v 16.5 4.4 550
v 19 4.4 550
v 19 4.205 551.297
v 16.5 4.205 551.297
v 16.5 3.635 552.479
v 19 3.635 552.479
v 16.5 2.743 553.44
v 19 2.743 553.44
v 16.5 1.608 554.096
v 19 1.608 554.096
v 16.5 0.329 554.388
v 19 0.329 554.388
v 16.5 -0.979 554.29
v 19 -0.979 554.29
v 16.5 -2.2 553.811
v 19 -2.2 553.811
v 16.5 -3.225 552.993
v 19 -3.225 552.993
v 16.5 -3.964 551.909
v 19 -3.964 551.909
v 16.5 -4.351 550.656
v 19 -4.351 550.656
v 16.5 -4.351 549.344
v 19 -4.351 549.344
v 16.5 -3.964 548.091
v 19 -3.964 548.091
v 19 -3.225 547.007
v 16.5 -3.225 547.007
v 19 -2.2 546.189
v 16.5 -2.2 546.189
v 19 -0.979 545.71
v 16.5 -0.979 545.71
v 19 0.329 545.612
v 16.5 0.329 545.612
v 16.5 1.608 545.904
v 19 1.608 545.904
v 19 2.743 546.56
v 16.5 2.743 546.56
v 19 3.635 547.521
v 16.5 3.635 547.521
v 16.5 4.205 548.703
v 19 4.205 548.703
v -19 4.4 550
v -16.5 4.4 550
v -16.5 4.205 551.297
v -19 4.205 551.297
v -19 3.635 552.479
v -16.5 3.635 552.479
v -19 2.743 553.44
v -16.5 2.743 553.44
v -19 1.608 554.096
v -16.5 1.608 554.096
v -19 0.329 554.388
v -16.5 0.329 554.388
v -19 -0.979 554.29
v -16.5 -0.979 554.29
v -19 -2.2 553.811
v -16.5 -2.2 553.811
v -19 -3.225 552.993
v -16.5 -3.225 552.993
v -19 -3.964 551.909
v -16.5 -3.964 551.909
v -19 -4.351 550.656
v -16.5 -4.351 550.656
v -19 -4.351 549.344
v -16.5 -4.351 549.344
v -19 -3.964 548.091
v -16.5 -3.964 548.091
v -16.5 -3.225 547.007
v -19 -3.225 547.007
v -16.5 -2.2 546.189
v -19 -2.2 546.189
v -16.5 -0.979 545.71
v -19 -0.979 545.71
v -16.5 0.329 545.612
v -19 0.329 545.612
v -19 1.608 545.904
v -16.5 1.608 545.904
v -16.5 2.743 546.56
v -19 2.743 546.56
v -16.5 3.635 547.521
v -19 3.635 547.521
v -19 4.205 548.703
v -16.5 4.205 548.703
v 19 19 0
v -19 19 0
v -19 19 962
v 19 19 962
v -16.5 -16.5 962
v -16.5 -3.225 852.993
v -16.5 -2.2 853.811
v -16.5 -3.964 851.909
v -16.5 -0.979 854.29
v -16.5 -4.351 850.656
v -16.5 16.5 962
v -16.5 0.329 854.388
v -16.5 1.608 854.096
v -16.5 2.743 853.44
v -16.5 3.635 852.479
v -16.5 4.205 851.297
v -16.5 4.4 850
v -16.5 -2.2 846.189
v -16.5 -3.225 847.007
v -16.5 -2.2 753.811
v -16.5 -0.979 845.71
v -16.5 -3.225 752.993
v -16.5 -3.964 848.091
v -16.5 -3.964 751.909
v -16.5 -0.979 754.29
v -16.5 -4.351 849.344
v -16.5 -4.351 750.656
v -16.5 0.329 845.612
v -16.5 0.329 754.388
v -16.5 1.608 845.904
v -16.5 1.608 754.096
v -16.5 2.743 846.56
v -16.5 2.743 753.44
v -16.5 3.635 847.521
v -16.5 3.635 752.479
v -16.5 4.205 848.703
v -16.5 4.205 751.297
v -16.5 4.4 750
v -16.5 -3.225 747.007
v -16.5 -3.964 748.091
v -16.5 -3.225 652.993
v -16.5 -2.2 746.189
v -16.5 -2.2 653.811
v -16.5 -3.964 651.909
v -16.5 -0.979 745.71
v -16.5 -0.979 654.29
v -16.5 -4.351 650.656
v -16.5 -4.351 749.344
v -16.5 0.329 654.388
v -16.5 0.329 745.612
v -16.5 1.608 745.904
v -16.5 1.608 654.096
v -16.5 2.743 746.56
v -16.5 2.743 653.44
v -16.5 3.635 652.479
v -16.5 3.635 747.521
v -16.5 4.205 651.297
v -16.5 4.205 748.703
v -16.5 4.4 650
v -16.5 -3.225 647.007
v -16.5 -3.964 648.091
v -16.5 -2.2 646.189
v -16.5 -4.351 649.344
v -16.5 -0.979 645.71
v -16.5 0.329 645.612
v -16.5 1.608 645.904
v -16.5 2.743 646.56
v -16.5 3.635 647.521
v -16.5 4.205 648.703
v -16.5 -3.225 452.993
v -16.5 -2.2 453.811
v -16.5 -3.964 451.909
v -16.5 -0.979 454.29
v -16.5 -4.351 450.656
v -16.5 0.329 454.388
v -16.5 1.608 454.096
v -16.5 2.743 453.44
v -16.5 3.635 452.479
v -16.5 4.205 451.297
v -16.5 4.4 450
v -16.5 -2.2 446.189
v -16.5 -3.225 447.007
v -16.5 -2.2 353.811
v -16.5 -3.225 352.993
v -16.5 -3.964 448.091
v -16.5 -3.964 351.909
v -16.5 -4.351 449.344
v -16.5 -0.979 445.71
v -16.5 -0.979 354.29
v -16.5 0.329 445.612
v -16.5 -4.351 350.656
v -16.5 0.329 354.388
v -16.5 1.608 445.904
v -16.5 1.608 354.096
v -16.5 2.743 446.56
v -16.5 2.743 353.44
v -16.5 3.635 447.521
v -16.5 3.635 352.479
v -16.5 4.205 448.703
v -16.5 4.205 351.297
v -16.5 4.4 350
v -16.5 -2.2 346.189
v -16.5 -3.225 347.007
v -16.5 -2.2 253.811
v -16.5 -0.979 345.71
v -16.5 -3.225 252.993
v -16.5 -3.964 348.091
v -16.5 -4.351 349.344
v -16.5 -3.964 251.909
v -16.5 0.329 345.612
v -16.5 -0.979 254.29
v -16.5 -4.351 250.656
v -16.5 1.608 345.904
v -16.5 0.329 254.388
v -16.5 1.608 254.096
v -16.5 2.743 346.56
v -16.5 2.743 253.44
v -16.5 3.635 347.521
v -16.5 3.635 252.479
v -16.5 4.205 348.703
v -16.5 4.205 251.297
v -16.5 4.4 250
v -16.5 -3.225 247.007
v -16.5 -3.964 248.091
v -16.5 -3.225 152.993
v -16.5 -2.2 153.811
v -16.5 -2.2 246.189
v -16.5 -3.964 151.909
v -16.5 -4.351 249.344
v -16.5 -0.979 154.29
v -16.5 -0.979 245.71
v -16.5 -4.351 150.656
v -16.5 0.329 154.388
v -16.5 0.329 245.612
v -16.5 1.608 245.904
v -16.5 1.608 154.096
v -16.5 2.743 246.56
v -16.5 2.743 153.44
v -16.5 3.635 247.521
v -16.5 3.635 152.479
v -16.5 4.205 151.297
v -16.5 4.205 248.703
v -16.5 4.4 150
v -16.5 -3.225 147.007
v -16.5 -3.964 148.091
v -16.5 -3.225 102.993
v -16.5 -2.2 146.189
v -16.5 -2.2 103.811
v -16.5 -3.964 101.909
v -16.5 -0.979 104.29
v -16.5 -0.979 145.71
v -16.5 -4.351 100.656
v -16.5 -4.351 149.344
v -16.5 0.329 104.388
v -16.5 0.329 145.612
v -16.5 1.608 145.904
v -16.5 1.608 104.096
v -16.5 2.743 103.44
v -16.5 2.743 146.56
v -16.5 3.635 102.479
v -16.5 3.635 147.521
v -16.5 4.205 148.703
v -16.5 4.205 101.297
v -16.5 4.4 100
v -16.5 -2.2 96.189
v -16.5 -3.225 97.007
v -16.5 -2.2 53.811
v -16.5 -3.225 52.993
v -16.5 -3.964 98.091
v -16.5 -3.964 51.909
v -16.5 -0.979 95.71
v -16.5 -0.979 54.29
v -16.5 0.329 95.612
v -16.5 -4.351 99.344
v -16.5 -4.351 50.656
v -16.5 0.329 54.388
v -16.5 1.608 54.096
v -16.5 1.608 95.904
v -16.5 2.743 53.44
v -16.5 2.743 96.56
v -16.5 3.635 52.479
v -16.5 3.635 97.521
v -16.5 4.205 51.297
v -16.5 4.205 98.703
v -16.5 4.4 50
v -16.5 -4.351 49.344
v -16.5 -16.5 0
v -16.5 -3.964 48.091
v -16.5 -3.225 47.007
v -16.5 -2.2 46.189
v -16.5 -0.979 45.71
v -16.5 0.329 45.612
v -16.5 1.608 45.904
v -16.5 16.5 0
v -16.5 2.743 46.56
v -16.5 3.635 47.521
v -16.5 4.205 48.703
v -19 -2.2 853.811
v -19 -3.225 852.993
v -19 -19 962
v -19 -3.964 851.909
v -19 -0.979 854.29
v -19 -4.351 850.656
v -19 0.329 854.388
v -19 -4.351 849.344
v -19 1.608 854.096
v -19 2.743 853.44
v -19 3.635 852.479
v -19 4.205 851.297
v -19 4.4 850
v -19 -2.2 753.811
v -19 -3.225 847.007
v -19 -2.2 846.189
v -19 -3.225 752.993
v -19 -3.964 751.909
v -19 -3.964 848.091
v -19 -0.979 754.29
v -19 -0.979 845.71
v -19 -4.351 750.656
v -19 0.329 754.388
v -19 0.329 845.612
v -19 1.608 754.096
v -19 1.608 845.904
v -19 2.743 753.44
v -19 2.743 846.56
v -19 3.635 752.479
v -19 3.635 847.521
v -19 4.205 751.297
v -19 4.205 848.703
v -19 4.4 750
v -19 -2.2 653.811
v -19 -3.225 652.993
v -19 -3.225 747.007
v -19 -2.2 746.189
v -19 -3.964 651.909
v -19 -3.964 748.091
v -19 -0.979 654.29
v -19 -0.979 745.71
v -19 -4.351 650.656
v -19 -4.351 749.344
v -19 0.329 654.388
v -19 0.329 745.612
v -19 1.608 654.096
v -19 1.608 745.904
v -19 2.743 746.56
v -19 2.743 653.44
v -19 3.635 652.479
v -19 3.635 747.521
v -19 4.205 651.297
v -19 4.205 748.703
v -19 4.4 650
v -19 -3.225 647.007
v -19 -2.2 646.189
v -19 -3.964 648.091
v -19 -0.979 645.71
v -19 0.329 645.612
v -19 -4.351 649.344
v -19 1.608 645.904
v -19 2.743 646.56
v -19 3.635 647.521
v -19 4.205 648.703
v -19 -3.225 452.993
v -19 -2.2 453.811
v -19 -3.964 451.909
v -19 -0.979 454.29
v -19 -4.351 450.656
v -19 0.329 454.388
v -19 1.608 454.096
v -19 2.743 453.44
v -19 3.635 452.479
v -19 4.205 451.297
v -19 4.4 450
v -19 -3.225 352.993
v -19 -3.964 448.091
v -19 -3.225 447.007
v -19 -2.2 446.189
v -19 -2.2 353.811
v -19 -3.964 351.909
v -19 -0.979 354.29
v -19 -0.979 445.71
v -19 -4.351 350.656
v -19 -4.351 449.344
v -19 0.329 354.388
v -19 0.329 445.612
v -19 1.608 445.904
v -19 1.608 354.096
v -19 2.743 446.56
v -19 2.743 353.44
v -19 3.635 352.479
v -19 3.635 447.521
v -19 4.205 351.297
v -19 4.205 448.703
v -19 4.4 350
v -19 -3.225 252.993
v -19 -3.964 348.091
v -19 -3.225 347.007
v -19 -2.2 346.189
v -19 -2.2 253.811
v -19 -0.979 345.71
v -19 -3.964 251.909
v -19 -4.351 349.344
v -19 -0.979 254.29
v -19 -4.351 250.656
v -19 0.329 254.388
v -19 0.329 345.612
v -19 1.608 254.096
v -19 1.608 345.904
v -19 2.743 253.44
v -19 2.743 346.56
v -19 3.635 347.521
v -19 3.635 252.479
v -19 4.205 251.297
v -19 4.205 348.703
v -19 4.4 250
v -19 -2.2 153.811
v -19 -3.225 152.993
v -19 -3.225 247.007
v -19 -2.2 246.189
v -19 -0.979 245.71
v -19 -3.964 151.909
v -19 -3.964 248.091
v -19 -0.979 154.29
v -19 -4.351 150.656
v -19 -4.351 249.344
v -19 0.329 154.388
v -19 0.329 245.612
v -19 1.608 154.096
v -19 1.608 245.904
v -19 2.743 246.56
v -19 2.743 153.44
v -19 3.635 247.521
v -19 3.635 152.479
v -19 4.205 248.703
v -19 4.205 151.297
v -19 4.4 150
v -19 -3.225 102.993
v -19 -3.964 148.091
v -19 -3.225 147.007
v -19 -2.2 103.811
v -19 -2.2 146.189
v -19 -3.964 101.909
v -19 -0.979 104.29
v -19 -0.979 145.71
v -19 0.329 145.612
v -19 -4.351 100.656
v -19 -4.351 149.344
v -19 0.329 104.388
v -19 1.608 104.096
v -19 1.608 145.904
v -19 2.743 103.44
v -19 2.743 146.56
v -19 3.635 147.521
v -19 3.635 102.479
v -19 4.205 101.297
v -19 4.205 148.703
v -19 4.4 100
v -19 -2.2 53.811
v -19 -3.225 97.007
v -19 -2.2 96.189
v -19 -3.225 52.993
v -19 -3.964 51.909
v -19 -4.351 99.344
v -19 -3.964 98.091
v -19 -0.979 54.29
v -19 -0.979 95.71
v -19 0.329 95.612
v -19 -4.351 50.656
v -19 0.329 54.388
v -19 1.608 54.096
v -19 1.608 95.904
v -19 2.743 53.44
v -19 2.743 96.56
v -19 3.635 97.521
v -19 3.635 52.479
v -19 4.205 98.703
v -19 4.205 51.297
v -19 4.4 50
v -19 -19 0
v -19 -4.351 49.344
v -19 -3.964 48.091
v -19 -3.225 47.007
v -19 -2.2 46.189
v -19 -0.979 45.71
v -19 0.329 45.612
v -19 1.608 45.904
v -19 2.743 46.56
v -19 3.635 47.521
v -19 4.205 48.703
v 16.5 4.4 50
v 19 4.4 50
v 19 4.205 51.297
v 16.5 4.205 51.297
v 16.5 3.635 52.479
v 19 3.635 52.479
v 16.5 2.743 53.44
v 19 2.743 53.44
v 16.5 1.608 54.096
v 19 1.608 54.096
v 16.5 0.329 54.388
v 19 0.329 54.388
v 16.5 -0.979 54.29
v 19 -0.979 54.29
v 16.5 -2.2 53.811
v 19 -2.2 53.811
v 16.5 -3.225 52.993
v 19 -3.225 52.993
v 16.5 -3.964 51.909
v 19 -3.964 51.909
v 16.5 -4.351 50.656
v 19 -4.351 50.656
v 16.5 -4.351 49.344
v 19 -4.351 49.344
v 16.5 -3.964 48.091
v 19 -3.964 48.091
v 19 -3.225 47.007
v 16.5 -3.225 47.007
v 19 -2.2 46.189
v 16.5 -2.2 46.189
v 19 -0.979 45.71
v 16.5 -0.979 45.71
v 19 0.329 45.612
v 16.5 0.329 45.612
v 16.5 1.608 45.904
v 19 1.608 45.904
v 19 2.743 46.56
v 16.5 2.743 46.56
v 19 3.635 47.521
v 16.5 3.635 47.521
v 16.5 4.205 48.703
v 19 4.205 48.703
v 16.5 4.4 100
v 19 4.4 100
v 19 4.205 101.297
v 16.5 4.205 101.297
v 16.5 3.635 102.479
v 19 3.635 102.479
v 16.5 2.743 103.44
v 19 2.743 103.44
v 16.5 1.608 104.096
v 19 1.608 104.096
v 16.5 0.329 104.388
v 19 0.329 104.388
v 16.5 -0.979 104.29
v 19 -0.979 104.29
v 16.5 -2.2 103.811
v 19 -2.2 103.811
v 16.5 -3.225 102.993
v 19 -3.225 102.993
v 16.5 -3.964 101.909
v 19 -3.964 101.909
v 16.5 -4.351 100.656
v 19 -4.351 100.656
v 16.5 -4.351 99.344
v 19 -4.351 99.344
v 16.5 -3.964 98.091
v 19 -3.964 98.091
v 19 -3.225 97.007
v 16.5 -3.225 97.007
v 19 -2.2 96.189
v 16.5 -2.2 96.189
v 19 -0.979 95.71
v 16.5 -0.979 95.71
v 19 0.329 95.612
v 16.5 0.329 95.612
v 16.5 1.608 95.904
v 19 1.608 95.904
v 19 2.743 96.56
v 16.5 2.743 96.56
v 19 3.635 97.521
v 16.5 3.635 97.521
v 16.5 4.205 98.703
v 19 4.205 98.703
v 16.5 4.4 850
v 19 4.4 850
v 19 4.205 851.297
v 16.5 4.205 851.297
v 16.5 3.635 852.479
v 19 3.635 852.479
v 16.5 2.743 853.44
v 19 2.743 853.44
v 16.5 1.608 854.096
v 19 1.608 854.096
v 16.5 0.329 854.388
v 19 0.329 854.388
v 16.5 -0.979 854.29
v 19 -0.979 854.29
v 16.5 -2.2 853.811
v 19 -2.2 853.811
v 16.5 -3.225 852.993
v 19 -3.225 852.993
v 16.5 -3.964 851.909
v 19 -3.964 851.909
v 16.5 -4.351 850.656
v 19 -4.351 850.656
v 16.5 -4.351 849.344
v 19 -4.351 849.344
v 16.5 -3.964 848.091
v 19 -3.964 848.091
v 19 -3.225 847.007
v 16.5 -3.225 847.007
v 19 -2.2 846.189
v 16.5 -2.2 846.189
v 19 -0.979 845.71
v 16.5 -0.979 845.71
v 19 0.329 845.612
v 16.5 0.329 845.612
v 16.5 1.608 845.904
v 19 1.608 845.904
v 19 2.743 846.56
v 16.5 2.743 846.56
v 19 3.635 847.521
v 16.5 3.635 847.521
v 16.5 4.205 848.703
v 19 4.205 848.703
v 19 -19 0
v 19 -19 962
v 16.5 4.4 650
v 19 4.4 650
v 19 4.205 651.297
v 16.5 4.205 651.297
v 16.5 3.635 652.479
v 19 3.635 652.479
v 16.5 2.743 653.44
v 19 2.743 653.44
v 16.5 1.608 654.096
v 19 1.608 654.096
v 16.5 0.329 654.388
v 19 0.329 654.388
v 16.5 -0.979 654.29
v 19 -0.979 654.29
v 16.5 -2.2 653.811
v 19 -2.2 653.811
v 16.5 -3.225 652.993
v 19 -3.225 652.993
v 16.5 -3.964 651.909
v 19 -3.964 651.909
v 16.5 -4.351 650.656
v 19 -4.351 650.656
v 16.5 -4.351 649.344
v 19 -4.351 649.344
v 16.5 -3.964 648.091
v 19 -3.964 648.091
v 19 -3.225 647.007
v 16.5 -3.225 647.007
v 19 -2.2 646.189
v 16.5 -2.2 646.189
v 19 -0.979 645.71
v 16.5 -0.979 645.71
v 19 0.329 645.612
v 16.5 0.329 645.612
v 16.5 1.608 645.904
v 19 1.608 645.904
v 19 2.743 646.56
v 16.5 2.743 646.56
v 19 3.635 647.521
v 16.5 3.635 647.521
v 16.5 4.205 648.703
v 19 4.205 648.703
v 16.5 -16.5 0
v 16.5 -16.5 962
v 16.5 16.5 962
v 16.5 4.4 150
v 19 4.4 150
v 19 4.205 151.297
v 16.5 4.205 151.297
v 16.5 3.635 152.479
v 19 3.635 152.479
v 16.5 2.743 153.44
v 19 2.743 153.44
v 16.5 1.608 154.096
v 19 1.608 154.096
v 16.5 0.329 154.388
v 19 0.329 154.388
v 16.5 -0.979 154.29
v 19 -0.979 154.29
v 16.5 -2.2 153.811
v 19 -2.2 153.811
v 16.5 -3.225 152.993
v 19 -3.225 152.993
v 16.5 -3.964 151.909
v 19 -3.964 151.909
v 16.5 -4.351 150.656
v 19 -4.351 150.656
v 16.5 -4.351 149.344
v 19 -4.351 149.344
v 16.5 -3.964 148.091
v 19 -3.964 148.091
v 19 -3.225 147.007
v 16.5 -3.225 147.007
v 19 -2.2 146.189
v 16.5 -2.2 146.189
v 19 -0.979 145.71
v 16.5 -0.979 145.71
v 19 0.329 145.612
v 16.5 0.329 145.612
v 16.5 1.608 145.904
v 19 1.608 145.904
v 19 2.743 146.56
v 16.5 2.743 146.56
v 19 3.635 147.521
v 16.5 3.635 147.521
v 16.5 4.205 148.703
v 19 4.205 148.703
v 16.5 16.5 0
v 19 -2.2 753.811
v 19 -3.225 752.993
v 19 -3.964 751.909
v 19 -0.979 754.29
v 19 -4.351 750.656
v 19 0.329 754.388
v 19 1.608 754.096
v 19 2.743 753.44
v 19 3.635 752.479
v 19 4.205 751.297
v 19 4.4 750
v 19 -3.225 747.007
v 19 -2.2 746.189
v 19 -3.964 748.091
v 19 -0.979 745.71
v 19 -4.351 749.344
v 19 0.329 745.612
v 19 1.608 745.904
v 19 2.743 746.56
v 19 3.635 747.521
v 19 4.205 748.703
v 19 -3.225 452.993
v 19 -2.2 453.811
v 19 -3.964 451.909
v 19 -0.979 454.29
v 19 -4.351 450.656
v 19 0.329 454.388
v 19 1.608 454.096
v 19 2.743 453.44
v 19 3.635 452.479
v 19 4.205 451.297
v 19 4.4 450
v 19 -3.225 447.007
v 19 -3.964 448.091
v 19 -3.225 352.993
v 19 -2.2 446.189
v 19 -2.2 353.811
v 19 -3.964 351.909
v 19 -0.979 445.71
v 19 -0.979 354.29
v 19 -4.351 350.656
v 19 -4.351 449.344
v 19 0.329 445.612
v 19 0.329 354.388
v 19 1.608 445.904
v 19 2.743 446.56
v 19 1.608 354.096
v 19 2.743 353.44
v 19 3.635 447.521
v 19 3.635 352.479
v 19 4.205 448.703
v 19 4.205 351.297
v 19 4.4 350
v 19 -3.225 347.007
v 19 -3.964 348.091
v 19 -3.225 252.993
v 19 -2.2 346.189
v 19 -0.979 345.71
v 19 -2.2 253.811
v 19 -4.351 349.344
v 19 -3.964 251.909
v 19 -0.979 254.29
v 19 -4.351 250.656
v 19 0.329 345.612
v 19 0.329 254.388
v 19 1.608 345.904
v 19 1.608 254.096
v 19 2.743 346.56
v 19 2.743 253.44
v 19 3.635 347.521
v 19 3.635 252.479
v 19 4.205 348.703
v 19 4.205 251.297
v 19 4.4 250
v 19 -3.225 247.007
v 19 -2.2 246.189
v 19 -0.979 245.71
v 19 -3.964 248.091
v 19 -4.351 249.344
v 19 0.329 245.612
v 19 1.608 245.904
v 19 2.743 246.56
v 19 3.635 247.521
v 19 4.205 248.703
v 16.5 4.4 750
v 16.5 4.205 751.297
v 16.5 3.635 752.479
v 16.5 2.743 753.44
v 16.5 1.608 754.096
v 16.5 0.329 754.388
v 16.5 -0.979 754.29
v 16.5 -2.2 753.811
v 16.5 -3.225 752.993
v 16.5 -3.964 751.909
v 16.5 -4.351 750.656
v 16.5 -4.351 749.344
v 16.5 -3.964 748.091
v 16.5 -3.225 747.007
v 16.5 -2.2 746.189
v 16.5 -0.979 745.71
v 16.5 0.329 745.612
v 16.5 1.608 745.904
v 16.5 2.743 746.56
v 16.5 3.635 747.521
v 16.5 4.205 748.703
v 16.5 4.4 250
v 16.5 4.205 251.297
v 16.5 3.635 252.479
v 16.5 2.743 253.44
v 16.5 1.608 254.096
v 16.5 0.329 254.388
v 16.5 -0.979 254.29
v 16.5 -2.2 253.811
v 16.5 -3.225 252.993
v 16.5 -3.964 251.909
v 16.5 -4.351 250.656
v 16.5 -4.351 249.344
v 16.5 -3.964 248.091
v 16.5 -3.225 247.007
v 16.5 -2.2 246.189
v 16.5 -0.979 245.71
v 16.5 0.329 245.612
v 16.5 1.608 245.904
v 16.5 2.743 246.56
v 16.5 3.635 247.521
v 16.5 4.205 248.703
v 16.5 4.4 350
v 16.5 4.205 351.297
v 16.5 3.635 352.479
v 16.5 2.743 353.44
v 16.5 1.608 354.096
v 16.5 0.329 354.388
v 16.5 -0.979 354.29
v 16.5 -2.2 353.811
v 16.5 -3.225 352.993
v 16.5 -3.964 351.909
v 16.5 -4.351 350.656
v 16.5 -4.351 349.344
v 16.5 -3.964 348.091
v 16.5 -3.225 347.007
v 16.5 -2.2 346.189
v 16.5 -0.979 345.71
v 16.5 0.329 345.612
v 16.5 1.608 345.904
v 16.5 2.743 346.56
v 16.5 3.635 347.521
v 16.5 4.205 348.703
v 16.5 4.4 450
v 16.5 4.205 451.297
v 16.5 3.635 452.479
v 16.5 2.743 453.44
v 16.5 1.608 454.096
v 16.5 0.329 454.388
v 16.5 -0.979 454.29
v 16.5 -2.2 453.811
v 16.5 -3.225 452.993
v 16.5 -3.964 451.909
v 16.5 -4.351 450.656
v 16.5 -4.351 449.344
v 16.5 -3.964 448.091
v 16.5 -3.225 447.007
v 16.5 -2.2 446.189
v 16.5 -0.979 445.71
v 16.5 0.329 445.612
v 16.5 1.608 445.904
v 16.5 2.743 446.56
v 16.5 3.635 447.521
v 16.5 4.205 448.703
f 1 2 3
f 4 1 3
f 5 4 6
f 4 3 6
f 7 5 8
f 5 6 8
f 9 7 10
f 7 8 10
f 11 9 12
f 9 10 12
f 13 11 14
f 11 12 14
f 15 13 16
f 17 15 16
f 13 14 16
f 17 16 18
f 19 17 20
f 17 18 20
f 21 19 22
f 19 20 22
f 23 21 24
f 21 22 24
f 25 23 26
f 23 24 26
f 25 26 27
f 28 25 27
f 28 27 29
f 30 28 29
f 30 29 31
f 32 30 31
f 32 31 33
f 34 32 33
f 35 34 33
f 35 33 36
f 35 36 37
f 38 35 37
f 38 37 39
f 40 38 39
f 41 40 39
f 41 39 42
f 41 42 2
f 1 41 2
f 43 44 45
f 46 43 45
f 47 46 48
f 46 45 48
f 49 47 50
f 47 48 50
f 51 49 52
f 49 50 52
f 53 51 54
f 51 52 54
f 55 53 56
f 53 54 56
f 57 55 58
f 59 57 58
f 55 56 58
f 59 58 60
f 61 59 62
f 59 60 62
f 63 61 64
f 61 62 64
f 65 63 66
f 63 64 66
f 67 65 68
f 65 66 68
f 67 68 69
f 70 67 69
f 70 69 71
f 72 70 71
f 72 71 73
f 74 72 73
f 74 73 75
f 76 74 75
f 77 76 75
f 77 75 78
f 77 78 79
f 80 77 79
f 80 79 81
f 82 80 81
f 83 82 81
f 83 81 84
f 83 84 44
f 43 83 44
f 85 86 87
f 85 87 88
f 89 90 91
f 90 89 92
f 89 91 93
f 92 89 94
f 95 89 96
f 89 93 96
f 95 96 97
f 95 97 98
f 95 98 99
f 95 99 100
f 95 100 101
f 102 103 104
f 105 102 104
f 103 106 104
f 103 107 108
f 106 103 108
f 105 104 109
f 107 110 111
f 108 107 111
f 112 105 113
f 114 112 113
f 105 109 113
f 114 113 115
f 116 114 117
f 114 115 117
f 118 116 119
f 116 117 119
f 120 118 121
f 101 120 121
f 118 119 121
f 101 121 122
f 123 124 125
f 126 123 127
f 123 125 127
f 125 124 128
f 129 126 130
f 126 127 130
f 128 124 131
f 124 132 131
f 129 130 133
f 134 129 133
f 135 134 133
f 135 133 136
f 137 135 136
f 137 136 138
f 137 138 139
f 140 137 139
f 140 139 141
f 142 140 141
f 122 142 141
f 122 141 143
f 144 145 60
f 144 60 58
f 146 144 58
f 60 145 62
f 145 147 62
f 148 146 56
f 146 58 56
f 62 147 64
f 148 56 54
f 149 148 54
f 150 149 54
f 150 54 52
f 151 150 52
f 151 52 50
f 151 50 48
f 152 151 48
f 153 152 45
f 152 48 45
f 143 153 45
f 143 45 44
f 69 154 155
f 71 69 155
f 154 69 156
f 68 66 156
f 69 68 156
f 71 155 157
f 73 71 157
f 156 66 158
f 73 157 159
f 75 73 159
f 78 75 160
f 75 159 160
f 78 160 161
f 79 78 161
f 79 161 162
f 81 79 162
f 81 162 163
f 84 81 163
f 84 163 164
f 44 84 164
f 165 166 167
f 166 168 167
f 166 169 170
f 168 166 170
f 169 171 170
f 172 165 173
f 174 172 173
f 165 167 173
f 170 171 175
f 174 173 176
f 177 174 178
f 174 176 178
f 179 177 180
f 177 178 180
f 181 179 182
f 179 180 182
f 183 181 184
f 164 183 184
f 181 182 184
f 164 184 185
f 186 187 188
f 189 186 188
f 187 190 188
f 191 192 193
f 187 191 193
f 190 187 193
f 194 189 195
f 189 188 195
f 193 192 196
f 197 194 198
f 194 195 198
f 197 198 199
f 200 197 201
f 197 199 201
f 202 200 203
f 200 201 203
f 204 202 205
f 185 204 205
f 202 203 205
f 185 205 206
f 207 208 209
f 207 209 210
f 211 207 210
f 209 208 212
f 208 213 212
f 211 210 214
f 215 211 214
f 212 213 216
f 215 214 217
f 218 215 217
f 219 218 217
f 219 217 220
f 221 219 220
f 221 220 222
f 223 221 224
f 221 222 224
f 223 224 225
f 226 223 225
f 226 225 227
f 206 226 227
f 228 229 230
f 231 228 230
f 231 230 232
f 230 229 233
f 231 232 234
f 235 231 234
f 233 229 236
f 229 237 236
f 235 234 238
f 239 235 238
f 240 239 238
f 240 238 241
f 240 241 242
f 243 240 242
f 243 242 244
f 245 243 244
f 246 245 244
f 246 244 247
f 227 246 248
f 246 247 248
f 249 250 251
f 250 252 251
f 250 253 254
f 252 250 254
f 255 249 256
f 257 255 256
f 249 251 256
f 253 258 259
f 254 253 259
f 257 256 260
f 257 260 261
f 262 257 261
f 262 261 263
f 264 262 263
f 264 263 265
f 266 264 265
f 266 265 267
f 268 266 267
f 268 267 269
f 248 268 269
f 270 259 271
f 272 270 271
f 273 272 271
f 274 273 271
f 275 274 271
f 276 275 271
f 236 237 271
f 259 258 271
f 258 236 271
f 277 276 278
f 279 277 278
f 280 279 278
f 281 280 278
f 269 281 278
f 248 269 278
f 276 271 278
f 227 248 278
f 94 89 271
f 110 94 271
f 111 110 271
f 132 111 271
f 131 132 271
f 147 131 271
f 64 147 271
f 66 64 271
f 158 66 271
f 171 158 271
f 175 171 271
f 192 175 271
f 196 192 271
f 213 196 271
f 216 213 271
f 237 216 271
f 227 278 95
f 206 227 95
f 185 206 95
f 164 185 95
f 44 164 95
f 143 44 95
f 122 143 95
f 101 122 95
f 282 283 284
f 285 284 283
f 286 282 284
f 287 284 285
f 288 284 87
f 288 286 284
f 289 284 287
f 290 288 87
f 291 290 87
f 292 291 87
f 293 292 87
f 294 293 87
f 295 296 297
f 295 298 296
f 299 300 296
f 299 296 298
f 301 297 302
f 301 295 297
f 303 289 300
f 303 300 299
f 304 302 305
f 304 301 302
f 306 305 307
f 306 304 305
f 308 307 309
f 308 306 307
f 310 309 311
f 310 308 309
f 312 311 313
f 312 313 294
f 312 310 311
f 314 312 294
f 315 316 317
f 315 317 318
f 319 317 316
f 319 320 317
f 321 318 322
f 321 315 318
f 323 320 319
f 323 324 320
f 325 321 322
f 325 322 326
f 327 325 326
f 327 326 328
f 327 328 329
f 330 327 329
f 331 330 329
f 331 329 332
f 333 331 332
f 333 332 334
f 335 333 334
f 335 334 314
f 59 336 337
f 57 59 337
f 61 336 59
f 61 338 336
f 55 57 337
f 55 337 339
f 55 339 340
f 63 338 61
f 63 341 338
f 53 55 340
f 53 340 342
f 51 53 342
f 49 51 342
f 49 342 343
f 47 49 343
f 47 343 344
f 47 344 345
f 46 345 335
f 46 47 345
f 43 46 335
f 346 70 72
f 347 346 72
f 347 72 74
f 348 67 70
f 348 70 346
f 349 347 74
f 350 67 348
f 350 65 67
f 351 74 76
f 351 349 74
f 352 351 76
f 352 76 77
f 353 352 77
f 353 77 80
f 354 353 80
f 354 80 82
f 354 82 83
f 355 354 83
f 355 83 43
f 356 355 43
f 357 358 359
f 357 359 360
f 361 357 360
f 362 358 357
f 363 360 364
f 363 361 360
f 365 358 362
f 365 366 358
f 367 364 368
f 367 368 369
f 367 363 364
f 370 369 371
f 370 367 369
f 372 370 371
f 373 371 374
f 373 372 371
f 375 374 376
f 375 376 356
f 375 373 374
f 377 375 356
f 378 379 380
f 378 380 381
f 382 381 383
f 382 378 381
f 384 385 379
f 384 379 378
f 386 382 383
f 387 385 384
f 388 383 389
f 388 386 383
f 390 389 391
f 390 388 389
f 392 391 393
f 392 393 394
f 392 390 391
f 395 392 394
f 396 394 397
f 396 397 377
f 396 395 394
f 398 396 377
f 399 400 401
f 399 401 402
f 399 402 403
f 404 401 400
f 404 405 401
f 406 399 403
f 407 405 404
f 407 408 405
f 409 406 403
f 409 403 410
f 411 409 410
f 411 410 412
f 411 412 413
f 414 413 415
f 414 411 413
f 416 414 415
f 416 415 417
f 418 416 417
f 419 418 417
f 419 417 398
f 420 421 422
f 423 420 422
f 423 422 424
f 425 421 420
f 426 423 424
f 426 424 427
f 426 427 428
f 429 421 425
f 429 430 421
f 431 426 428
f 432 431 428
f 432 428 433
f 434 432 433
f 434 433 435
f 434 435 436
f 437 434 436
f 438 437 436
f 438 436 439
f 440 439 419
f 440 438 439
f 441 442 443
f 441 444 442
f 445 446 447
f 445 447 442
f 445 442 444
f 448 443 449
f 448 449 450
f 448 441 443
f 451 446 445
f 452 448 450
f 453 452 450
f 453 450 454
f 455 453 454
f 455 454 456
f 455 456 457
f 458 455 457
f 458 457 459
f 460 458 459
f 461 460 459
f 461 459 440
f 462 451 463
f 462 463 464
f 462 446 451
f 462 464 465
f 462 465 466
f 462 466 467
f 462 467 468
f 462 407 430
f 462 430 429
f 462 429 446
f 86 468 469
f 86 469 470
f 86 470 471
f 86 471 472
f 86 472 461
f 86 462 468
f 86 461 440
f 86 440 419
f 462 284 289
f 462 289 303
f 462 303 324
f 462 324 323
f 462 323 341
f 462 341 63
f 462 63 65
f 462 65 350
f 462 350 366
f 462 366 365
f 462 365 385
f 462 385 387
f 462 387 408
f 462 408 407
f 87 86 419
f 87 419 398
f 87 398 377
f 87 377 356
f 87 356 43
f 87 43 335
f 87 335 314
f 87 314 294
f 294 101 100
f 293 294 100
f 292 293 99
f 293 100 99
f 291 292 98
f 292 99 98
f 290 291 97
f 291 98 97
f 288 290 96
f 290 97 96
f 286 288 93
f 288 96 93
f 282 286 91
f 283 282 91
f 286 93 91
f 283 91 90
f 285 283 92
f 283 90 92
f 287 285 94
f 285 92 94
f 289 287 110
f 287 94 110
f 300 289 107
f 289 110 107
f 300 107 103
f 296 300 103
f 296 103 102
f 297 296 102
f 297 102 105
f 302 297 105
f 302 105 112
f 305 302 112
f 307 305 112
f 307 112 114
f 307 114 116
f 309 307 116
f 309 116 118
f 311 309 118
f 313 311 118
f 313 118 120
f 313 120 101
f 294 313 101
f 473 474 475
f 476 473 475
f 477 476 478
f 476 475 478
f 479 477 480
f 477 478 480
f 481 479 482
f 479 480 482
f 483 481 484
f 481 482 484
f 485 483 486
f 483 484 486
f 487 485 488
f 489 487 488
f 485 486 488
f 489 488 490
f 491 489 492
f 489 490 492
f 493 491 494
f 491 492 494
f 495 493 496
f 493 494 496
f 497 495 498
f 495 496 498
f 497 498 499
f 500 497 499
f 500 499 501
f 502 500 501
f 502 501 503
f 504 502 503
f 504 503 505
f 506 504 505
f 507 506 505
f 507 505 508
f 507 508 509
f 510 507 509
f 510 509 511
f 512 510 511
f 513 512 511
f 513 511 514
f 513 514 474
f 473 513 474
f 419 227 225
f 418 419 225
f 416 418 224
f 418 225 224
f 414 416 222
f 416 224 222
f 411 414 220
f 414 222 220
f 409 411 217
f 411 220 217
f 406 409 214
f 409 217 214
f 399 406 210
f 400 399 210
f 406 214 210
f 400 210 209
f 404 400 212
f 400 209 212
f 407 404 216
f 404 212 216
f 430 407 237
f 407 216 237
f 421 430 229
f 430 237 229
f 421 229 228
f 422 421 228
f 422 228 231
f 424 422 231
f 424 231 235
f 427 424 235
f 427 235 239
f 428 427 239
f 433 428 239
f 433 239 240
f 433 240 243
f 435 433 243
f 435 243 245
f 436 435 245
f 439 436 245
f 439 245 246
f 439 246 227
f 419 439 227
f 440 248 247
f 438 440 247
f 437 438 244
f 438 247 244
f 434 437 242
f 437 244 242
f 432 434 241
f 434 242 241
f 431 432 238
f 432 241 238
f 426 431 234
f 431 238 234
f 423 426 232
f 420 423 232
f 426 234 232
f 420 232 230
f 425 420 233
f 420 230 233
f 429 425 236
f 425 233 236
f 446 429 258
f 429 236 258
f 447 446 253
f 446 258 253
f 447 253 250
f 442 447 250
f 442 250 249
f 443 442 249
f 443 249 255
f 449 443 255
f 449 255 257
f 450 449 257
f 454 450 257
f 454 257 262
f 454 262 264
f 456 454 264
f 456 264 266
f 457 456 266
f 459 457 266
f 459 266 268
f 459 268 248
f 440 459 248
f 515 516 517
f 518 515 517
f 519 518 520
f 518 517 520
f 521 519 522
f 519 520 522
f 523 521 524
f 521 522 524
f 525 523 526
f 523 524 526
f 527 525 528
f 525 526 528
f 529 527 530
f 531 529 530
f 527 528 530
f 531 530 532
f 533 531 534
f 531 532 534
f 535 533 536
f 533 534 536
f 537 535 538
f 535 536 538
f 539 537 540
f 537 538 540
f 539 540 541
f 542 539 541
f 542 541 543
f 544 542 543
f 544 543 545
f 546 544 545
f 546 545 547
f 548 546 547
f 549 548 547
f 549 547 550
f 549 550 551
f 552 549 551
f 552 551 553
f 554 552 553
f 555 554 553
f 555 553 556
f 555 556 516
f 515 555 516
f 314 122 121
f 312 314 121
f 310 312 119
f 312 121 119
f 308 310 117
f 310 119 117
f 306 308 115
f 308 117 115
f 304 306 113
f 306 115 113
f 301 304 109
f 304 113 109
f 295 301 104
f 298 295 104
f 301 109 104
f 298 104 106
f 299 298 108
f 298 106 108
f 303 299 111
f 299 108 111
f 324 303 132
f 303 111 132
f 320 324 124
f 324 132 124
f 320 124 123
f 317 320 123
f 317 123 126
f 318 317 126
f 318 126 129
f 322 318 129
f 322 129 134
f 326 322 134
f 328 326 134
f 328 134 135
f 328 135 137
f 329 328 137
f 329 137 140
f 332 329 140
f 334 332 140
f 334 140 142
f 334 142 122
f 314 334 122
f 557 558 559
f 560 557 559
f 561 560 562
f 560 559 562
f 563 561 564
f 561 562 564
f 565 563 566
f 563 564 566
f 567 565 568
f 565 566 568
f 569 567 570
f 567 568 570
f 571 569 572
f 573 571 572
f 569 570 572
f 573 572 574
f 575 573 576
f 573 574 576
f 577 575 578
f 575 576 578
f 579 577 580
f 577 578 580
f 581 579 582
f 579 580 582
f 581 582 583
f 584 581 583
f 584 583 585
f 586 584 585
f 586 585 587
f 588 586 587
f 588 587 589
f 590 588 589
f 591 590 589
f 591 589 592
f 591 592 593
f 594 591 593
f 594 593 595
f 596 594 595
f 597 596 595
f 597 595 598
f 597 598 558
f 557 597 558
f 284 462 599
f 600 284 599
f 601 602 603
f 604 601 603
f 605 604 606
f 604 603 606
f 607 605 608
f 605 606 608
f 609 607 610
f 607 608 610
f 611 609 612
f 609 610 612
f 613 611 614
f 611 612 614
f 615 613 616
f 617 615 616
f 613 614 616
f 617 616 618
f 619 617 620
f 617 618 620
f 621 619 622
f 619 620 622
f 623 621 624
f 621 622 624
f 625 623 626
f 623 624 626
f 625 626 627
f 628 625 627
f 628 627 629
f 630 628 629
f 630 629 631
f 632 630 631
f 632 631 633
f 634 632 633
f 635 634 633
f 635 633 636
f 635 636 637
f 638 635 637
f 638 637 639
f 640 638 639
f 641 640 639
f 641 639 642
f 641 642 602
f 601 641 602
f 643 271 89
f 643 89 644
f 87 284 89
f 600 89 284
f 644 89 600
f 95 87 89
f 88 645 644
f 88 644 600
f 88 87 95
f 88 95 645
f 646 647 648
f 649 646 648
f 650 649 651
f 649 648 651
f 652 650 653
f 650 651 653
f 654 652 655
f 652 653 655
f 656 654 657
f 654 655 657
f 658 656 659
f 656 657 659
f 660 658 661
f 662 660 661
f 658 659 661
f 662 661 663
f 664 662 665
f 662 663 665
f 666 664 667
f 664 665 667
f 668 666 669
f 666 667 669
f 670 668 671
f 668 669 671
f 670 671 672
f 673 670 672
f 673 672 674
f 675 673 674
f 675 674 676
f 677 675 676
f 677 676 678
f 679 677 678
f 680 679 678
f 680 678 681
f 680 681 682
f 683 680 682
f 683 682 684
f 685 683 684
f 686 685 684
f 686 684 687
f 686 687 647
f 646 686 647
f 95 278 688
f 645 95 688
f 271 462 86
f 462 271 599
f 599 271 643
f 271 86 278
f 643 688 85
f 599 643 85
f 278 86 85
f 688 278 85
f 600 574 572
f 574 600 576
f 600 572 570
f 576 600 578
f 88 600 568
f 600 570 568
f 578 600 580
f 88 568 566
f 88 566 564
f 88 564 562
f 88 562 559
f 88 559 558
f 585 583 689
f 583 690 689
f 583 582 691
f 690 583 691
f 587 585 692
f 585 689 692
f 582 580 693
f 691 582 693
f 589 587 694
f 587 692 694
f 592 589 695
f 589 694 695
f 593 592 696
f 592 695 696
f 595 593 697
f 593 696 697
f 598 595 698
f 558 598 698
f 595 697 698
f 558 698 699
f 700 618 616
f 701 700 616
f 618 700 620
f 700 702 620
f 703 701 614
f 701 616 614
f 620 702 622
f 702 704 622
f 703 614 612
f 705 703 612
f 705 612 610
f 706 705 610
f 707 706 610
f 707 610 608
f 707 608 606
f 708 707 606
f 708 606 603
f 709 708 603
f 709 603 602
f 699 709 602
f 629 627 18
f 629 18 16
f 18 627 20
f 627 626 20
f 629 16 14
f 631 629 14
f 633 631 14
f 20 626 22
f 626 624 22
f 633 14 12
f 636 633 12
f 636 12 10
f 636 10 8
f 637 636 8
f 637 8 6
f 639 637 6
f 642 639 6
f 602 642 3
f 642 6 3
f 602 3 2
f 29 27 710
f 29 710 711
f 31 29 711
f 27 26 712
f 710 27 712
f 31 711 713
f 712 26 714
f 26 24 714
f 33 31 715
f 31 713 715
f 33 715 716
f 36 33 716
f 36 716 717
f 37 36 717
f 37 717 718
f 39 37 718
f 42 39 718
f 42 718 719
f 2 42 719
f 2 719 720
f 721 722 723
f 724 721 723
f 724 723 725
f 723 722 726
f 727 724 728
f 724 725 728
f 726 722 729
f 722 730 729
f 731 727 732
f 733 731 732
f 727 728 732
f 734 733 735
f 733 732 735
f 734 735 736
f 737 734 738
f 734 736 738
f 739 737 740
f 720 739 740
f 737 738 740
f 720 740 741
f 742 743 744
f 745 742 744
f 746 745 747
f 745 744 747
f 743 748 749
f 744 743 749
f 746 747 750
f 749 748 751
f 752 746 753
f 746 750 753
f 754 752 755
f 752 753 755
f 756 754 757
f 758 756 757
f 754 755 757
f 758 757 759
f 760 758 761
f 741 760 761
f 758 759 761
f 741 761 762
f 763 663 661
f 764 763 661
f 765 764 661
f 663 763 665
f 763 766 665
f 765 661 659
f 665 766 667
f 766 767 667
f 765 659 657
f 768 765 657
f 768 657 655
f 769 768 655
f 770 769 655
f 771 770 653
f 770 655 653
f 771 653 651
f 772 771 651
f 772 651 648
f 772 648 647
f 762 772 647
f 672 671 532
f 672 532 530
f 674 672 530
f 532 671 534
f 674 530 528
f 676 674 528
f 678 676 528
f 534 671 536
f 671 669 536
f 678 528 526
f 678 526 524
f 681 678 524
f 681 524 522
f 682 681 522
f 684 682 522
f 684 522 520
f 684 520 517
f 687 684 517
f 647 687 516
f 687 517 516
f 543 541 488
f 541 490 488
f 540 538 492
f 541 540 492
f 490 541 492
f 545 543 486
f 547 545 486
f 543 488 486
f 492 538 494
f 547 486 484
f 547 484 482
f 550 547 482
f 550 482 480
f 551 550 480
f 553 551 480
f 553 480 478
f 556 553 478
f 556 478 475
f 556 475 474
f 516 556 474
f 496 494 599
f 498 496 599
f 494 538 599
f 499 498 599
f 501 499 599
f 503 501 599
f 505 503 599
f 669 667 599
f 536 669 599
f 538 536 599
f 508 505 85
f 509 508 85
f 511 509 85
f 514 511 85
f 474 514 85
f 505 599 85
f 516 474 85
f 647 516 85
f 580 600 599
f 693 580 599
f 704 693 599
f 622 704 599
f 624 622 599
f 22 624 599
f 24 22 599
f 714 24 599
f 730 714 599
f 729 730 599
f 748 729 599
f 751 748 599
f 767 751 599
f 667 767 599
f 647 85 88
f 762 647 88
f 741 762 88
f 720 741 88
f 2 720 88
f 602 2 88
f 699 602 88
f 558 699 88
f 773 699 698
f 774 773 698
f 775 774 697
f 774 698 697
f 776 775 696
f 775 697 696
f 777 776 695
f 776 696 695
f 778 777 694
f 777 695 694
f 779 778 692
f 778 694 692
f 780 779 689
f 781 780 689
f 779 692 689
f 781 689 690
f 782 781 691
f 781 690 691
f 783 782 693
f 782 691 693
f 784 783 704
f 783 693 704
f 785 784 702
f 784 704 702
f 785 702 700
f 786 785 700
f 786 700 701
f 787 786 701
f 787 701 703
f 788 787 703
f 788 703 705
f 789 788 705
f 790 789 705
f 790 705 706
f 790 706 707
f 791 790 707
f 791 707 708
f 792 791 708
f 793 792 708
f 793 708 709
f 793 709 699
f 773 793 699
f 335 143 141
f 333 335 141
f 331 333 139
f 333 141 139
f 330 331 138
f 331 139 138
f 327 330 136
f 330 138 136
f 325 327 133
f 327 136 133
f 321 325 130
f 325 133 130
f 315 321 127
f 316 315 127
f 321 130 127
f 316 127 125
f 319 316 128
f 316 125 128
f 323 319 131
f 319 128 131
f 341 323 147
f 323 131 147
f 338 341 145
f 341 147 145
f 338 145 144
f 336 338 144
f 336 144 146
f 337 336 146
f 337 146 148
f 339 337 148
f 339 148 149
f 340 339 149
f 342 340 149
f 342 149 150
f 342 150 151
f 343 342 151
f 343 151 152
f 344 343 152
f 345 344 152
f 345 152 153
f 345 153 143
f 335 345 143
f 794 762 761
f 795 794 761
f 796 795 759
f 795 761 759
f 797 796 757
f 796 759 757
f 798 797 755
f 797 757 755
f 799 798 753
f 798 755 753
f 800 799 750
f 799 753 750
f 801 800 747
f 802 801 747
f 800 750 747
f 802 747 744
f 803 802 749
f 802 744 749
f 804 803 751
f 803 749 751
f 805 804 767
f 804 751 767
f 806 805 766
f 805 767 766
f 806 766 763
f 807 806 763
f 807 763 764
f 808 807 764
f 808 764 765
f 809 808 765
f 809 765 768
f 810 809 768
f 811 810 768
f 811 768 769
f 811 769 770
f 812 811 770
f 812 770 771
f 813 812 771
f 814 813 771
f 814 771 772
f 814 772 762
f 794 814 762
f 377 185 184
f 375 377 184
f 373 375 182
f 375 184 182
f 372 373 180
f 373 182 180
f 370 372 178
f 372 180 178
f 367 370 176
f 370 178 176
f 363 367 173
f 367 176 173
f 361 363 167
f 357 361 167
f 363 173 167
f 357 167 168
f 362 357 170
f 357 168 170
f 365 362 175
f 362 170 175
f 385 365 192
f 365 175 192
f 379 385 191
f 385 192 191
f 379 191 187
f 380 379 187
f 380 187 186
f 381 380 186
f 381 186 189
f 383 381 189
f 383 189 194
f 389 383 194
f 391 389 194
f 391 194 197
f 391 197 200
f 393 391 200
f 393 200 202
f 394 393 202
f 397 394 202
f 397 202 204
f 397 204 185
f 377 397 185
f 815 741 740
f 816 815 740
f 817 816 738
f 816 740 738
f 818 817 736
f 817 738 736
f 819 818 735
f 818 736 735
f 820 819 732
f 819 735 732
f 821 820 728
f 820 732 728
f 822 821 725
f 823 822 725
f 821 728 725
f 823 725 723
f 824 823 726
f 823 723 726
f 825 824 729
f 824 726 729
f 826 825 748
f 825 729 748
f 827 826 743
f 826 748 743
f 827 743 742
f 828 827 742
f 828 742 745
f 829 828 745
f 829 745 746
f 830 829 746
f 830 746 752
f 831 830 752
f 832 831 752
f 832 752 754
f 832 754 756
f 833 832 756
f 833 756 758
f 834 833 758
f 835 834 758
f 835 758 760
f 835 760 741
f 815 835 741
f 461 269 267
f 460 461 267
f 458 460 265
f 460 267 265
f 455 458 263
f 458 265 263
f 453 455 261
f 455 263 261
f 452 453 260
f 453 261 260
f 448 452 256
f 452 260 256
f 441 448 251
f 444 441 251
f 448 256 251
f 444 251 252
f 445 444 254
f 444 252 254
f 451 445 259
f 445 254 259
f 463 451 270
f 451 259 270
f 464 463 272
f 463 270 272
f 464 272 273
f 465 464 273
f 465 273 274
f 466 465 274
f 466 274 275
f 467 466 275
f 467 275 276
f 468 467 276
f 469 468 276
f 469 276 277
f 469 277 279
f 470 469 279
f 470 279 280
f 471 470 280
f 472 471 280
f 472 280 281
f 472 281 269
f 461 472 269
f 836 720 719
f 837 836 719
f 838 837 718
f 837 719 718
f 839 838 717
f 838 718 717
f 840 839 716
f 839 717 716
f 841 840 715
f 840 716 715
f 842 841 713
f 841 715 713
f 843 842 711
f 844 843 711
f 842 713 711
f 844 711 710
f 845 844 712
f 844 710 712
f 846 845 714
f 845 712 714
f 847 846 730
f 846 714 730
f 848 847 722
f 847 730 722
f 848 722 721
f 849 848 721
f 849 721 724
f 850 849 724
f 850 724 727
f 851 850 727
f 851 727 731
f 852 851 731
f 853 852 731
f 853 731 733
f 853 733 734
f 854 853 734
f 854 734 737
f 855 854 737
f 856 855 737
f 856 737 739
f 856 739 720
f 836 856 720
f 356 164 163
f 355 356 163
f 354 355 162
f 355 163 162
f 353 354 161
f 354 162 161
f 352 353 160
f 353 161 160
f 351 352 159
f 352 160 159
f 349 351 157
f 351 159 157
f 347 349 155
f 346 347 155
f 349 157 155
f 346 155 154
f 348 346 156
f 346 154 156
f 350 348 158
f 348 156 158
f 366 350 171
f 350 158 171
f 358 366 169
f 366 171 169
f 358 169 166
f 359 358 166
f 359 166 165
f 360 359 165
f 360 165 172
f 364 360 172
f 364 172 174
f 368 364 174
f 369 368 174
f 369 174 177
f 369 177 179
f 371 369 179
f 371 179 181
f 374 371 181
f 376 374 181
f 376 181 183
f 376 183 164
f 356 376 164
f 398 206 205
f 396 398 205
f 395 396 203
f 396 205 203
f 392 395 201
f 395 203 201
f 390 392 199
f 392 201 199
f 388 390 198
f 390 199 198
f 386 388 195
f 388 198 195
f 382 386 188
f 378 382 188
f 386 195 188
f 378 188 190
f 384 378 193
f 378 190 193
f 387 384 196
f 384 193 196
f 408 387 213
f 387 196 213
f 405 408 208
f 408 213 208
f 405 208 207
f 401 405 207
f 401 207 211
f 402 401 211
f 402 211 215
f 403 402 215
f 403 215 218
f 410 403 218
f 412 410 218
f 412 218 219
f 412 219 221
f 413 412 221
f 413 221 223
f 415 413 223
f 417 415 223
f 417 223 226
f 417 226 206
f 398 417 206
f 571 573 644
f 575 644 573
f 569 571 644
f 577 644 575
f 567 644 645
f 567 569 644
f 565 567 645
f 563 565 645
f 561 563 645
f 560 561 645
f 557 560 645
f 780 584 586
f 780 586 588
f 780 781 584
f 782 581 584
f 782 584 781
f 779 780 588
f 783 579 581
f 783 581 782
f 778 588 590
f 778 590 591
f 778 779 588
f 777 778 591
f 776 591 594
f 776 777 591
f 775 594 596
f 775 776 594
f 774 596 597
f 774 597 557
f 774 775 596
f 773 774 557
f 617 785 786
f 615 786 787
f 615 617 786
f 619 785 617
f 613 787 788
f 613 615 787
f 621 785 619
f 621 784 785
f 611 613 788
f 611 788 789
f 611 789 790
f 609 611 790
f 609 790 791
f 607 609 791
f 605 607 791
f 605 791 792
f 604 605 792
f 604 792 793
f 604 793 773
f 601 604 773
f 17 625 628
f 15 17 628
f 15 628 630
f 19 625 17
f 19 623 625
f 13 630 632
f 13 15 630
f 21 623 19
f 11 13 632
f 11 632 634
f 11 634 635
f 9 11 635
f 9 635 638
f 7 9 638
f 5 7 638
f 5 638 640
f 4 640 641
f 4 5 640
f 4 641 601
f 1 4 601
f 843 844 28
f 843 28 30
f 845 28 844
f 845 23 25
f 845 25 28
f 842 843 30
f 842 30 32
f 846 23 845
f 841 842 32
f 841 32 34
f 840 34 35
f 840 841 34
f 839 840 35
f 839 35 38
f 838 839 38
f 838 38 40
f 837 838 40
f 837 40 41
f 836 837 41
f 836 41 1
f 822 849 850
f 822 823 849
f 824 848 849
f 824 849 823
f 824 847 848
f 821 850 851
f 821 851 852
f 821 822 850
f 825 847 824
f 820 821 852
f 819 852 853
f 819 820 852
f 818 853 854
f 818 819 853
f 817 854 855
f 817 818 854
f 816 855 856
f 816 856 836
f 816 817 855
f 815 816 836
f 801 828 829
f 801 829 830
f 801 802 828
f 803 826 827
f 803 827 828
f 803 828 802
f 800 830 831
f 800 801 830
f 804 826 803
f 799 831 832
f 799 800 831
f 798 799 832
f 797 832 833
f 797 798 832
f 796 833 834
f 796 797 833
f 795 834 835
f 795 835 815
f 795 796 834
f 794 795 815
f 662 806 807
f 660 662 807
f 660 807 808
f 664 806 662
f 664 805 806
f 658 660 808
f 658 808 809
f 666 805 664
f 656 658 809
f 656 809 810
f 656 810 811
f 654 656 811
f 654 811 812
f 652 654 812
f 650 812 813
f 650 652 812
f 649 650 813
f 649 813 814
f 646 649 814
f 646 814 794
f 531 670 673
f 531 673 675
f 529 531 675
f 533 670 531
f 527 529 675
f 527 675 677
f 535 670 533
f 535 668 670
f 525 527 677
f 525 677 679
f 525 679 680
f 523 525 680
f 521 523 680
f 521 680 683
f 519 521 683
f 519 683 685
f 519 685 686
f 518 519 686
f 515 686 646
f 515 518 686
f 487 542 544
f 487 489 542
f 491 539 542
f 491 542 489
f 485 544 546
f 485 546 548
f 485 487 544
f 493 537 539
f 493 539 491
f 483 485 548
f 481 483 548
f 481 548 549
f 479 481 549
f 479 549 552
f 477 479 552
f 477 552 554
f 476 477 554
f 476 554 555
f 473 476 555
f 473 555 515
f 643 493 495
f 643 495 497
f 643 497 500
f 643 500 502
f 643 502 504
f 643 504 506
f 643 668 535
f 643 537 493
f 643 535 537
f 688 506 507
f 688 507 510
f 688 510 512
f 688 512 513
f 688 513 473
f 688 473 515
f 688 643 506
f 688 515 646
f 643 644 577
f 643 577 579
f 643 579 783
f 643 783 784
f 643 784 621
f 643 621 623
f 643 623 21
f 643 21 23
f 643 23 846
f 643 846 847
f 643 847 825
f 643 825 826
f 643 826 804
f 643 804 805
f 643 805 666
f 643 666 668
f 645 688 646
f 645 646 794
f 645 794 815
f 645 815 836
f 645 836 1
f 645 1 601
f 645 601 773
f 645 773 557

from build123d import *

# Parameters (mm, degrees)
F0_W     = 38
F0_H     = 38
F0_W_2   = 33
F0_H_2   = 33
F1_DEPTH = 962
F3_D     = 8.8


with BuildPart() as f1:
    # F0 (on Top) → F1 (new body)
    with BuildSketch(Plane.XY):
        Rectangle(F0_W, F0_H)
        Rectangle(F0_W_2, F0_H_2, mode=Mode.SUBTRACT)
    extrude(amount=F1_DEPTH)

    # F3 (through all)
    with Locations(Plane(origin=(-19, 0, 0), x_dir=(0, -1, 0), z_dir=(-1, 0, 0))):
        with Locations((0, 250), (0, 350), (0, 450), (0, 150), (0, 100), (0, 50), (0, 550), (0, 750), (0, 650), (0, 850)):
            Hole(F3_D / 2)


solid = f1.part
